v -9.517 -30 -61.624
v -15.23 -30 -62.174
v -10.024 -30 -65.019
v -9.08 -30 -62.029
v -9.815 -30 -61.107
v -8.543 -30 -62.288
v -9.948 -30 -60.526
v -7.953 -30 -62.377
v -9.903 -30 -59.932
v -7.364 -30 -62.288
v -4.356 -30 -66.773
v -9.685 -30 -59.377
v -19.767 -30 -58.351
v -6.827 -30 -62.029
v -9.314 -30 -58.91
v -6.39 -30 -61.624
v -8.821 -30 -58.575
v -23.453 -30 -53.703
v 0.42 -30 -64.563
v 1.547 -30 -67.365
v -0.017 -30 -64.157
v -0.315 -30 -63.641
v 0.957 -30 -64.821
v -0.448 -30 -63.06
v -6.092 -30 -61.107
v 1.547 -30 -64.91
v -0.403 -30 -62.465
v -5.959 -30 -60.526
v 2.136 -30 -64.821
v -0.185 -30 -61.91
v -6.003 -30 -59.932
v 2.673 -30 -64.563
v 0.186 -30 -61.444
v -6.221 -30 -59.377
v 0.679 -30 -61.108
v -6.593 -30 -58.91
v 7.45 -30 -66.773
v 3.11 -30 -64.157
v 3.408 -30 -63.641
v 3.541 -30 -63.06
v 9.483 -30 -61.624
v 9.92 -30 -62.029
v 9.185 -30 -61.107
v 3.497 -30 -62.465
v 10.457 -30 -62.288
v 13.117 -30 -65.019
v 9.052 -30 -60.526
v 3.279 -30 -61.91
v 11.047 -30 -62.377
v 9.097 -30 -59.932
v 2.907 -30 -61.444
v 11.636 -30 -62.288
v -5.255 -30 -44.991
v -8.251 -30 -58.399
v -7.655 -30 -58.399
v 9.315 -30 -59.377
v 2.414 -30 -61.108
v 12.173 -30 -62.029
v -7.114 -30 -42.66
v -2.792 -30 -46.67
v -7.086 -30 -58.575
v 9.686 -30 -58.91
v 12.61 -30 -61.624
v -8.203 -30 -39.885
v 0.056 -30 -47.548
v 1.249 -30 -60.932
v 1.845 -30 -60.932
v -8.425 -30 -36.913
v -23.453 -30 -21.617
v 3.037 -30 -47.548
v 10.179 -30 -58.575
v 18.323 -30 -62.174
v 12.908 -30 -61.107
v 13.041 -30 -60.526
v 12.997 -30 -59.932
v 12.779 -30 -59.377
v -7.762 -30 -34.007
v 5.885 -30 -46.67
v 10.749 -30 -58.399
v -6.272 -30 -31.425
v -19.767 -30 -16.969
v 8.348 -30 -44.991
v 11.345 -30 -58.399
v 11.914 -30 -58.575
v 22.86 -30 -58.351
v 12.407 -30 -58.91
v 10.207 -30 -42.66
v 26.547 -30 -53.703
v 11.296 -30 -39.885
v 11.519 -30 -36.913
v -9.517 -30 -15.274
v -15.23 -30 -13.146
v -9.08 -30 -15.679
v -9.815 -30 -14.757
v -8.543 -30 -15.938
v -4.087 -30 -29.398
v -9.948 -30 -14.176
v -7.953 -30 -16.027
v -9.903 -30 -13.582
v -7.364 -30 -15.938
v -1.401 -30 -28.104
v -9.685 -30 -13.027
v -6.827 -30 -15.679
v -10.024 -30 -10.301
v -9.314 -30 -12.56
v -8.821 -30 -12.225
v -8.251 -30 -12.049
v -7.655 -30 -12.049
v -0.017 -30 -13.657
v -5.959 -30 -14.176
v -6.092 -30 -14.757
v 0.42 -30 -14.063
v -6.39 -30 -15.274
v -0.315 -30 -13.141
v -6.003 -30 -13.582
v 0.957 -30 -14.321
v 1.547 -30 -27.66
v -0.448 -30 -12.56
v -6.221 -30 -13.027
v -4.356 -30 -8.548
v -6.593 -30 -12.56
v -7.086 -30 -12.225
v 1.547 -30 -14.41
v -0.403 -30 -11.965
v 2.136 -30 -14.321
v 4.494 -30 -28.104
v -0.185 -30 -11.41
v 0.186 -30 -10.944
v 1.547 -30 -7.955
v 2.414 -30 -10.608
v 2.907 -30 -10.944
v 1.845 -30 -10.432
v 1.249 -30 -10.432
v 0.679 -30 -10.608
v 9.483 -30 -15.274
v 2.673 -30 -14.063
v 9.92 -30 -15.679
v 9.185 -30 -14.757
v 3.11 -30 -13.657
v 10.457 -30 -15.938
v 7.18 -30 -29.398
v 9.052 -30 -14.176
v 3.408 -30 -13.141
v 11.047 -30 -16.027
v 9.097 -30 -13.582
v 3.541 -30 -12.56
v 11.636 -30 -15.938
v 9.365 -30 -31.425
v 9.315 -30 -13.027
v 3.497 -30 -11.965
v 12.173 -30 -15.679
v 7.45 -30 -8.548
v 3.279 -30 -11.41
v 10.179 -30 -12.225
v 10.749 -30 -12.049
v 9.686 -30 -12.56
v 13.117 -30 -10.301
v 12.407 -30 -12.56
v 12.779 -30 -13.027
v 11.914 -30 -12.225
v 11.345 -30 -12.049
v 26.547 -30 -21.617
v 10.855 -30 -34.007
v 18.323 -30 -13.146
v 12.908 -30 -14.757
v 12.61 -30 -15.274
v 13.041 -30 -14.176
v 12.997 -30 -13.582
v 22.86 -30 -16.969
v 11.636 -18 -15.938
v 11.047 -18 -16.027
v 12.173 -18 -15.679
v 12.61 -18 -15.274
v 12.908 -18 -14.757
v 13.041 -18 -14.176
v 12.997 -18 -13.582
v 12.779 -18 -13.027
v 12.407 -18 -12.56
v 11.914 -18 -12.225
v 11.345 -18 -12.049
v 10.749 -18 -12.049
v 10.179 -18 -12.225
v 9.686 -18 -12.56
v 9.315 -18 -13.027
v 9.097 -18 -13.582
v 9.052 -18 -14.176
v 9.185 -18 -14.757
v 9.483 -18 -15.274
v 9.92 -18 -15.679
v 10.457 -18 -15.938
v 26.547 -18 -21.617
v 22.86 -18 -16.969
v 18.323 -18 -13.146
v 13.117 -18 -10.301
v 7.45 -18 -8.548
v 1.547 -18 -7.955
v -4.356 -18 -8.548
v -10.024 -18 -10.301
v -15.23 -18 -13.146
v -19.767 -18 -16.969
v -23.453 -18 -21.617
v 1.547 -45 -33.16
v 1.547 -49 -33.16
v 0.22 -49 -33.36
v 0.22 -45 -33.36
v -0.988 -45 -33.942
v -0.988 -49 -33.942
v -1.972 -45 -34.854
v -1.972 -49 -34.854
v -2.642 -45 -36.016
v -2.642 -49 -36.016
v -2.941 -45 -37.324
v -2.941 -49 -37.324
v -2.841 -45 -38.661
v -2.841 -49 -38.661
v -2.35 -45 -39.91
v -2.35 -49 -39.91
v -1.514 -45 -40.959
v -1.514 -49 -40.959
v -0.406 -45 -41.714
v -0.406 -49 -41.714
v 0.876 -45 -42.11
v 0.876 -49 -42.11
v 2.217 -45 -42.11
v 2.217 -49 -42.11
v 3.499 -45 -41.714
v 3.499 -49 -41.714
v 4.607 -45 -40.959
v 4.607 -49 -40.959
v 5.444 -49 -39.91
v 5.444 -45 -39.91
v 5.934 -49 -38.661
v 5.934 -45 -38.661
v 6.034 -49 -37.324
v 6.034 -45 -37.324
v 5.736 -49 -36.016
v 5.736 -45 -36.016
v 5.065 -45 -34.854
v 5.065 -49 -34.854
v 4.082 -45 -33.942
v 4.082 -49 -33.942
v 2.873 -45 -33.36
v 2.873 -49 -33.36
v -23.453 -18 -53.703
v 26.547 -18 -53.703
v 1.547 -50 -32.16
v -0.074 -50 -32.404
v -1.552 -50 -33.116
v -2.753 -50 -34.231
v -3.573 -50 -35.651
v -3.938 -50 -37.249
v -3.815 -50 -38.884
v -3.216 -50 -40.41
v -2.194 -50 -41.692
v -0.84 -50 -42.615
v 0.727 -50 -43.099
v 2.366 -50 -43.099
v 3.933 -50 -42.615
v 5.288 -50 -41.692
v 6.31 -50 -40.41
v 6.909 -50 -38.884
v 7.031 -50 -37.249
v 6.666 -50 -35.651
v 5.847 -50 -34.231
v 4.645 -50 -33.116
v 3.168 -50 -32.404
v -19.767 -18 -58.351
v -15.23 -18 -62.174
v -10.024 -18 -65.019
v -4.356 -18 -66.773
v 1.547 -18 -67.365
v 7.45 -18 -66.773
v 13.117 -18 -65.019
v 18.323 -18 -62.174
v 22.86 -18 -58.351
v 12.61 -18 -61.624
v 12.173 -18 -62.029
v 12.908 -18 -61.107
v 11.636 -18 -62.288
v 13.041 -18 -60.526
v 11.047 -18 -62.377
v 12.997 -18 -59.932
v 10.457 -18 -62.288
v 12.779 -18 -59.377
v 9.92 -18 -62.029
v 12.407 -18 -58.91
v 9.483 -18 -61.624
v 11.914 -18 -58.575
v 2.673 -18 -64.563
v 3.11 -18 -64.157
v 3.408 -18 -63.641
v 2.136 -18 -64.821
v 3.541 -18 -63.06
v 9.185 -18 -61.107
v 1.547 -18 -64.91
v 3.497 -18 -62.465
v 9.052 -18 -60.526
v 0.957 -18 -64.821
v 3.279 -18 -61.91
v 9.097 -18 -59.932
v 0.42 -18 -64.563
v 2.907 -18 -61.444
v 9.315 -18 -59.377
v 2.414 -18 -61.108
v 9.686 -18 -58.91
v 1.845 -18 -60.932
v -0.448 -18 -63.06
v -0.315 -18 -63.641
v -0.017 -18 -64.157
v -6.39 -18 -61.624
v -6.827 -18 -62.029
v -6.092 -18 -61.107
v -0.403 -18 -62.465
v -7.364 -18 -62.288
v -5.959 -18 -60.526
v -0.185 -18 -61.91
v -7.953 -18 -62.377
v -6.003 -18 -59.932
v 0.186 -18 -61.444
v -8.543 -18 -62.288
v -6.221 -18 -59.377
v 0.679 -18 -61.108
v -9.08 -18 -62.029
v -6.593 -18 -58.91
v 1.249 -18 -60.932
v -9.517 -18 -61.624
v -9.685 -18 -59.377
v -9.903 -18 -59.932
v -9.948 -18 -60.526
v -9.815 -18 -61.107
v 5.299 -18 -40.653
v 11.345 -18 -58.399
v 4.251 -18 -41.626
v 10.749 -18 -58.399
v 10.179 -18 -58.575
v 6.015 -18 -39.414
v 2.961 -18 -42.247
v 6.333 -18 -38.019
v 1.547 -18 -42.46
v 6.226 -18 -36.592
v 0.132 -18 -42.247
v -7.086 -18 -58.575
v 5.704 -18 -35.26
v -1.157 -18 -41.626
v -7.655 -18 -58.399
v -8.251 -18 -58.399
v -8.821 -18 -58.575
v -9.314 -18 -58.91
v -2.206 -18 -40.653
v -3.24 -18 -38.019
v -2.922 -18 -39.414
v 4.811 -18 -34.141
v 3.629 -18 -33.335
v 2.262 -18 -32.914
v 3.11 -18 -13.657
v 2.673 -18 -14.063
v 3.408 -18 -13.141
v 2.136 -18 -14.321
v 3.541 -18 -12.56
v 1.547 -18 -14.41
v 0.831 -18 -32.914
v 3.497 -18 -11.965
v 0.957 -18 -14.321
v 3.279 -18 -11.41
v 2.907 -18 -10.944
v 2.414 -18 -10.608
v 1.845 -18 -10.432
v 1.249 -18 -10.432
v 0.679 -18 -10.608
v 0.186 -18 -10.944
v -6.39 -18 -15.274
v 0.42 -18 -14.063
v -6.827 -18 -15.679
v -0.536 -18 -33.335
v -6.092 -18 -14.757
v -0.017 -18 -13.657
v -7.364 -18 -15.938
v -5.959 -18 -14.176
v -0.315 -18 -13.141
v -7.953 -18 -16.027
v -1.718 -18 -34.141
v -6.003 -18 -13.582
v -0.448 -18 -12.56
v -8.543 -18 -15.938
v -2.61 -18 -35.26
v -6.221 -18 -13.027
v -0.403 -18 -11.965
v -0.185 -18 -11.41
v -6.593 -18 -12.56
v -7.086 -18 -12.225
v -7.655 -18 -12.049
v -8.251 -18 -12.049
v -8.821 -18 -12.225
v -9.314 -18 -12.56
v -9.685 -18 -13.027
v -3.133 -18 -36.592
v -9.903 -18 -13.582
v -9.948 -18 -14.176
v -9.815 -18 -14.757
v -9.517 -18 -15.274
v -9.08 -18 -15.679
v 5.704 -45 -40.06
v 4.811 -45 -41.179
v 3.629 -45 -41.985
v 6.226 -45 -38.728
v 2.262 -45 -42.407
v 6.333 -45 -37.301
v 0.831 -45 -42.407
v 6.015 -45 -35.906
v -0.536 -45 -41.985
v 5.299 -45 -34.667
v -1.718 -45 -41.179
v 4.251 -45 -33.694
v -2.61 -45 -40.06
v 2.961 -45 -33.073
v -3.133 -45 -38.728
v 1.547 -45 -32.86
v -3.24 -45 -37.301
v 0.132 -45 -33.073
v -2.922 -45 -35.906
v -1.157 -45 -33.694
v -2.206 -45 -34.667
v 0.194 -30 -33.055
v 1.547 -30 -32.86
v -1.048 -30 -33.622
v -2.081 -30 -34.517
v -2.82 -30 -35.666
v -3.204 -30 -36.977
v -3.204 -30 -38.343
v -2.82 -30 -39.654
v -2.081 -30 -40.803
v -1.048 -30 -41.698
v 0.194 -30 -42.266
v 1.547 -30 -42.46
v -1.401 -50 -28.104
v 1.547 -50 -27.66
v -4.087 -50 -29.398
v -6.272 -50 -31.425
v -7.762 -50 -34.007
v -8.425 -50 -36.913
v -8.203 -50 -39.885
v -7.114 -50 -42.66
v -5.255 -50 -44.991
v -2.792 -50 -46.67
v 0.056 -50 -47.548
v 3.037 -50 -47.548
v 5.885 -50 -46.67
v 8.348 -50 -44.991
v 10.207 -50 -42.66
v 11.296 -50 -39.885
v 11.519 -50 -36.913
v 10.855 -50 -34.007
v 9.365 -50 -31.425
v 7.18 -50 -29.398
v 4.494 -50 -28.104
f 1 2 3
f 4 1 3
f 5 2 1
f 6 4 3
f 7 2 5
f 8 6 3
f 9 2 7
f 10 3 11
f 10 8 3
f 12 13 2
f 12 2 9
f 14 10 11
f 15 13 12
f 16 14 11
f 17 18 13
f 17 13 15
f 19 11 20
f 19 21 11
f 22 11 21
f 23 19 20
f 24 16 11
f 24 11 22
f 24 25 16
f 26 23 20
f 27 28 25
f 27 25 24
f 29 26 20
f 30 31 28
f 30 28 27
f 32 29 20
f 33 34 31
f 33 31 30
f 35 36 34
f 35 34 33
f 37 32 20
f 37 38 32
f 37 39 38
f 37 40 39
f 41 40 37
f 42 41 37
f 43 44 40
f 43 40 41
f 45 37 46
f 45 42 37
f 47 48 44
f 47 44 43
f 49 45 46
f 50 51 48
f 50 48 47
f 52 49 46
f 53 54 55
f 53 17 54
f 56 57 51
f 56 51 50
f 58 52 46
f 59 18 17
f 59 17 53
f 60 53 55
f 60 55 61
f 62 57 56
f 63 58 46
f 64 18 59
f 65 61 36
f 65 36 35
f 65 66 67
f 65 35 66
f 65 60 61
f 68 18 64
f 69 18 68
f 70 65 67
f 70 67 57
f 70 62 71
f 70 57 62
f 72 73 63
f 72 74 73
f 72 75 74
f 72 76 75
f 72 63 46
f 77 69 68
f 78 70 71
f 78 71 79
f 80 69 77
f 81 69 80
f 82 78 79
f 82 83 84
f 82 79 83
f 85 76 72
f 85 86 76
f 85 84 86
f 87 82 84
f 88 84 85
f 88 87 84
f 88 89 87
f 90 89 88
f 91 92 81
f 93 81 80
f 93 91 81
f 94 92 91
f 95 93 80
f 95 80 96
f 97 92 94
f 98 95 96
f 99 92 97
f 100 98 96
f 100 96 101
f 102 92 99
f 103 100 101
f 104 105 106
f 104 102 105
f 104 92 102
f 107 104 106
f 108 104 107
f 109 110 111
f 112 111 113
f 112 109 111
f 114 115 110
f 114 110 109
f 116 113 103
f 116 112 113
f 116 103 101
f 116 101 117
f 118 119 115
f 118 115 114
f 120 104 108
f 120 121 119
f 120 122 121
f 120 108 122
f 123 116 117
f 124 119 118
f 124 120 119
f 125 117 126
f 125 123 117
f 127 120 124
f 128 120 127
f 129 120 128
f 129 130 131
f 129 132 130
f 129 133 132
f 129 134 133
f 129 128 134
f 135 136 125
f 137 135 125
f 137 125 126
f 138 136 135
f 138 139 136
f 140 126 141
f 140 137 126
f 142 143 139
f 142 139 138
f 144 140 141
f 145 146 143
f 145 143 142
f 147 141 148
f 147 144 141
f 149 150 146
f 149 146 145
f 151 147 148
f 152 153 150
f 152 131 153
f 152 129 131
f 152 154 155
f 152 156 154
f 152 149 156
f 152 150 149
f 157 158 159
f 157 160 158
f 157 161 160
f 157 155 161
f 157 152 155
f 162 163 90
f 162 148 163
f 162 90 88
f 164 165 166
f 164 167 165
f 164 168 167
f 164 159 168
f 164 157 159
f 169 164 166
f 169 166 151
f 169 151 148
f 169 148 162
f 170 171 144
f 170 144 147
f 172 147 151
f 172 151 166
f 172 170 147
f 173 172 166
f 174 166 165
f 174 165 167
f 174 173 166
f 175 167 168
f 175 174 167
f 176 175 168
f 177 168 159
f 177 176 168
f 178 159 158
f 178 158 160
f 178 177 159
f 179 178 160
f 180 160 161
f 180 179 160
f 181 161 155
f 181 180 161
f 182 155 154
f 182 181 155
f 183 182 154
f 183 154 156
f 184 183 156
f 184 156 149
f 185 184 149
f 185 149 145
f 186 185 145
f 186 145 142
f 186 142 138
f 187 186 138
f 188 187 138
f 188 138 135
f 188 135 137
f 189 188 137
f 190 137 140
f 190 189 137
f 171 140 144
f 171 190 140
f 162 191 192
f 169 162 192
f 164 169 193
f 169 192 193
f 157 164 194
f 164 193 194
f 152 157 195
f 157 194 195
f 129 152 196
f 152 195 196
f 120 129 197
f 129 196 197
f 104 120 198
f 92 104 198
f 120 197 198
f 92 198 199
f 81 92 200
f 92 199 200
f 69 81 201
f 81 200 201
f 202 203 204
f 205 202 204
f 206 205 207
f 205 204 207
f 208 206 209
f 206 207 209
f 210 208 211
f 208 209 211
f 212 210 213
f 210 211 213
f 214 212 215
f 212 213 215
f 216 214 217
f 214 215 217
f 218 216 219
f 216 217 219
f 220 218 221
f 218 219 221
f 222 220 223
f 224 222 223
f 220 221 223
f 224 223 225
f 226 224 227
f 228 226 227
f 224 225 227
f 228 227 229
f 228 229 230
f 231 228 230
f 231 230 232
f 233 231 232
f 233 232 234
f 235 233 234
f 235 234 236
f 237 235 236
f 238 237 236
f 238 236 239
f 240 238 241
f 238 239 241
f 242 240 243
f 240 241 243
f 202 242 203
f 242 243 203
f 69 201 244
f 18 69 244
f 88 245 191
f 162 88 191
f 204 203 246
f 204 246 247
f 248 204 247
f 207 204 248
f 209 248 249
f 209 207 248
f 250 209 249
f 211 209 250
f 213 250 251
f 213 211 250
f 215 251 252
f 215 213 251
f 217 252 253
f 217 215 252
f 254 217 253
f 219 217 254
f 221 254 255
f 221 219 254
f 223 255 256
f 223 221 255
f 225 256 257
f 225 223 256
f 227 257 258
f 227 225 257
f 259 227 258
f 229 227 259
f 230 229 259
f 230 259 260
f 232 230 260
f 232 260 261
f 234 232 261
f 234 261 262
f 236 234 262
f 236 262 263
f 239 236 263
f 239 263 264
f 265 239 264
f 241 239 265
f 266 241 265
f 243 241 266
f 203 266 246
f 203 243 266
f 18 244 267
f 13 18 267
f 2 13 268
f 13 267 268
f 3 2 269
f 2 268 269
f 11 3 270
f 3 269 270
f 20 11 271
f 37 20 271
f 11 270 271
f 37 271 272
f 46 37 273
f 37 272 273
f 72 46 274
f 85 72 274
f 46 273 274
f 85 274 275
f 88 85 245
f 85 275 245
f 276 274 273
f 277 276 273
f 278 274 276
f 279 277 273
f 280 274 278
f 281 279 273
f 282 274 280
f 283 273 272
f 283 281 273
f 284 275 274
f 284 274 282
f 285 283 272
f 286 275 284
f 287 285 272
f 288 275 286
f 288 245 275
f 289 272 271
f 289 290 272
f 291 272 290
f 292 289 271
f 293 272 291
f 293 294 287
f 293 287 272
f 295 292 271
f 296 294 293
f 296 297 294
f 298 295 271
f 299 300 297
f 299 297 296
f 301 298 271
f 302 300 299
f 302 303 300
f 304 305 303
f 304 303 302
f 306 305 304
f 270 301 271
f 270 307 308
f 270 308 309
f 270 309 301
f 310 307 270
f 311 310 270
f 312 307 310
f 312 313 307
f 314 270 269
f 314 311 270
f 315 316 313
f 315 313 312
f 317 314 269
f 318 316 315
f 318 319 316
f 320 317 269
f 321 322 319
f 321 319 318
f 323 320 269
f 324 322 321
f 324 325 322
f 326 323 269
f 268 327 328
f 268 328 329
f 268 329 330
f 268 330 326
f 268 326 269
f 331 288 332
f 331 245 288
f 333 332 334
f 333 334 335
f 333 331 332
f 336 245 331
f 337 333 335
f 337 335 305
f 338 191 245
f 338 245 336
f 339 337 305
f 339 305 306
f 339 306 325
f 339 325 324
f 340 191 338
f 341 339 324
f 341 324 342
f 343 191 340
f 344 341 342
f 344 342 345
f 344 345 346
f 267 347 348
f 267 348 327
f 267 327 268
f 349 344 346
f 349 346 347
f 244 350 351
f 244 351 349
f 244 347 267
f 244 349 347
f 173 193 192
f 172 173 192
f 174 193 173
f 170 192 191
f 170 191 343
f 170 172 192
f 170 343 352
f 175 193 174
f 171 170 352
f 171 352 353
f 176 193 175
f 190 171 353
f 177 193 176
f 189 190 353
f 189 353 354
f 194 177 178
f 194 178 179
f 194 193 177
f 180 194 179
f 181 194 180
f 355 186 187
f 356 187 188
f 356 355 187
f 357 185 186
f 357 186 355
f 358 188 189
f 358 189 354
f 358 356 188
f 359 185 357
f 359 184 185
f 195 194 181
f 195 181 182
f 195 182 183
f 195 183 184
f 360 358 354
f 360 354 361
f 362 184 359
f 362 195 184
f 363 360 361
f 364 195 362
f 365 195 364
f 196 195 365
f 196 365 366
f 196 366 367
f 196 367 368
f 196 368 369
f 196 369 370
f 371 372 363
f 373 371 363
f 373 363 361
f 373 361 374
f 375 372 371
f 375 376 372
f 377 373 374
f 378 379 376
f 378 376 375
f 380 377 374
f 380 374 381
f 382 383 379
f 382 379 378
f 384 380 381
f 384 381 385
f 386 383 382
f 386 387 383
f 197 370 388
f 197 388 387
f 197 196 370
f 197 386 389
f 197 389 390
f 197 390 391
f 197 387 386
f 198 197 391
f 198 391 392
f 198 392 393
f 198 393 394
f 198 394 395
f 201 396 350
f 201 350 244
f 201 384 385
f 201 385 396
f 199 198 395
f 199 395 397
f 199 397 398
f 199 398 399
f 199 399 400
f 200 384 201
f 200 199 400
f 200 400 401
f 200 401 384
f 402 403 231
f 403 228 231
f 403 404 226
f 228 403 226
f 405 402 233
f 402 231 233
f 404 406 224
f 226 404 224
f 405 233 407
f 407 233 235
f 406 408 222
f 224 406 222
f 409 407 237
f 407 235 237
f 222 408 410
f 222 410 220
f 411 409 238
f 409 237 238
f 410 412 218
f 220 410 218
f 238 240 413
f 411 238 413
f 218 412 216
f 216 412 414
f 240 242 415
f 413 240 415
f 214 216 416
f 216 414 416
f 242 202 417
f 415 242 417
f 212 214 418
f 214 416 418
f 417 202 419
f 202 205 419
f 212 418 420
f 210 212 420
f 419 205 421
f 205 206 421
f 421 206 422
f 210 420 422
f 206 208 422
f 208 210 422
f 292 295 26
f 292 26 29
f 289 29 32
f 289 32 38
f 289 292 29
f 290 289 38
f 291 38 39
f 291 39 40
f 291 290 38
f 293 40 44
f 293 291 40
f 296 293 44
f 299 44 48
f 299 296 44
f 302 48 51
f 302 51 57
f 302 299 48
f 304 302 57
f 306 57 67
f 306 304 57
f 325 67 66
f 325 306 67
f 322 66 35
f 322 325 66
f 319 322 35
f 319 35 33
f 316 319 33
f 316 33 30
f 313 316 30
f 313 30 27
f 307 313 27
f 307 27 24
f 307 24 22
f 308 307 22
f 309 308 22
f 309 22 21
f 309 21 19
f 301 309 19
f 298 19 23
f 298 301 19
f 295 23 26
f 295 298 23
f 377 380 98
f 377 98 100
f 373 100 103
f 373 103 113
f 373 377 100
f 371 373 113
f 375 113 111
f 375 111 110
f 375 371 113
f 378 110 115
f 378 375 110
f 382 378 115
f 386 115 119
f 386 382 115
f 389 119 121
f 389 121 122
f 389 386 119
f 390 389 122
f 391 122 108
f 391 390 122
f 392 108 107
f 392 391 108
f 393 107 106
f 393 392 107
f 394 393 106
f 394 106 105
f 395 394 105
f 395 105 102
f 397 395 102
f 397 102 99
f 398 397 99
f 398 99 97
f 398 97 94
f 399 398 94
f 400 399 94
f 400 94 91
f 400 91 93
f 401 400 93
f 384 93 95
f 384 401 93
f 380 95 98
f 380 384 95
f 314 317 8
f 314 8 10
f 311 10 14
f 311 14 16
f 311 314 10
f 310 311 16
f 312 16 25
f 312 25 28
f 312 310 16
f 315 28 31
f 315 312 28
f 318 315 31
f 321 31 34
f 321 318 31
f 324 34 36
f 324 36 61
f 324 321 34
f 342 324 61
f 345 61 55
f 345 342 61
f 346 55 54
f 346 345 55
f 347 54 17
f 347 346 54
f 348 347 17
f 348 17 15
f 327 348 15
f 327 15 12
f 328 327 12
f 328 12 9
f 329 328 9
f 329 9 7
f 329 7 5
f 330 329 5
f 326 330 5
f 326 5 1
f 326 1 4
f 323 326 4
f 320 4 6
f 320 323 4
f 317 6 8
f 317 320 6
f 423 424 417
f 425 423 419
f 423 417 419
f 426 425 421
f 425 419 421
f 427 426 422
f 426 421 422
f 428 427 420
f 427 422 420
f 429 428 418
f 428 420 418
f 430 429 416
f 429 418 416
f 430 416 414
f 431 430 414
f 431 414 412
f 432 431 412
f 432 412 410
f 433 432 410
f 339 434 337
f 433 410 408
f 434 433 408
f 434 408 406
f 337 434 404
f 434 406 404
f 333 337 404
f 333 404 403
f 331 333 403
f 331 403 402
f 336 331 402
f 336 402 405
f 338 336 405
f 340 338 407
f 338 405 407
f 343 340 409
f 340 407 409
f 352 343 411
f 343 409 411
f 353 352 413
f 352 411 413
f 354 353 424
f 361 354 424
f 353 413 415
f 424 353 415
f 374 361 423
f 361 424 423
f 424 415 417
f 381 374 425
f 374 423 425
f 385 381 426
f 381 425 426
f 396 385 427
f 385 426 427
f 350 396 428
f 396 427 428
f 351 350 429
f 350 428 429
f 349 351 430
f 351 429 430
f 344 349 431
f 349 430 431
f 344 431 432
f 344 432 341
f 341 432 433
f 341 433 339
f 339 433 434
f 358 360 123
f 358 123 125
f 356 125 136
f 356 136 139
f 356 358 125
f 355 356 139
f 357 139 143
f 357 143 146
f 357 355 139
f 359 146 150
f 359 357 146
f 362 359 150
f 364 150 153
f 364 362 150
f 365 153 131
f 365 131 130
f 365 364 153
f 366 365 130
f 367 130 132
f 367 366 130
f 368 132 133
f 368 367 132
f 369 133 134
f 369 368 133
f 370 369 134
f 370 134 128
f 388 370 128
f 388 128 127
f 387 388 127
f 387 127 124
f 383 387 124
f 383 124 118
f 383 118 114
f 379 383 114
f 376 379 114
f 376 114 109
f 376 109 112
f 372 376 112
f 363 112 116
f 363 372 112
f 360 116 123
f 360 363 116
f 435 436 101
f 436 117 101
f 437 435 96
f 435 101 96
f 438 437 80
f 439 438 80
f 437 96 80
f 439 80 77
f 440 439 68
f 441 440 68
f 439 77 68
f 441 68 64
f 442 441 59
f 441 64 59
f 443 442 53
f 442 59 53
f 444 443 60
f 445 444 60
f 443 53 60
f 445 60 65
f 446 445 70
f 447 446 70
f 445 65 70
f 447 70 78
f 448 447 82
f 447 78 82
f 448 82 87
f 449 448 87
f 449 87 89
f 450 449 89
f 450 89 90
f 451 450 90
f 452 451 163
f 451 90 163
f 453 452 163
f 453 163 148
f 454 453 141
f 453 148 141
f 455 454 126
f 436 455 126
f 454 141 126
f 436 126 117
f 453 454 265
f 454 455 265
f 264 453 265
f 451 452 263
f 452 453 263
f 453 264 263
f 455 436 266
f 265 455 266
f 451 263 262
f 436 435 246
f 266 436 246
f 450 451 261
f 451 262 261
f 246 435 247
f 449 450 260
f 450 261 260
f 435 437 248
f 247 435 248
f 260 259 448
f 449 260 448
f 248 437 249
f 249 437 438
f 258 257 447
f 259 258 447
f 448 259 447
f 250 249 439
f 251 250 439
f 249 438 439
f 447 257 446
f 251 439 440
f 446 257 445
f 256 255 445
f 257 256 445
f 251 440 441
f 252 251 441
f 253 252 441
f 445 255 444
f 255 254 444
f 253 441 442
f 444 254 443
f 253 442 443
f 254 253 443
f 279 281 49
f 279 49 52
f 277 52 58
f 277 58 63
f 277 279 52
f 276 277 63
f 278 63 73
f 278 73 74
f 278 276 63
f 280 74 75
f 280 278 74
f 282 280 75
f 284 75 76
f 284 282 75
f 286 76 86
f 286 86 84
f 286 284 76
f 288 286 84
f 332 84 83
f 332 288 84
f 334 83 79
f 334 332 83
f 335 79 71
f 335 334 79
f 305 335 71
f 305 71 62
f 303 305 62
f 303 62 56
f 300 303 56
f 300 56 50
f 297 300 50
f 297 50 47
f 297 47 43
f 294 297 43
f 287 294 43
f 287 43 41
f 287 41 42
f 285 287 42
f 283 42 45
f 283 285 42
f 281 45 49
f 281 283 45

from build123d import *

# Parameters (mm, degrees)
SKETCH1_R           = 2
BOSS_EXTRUDE1_DEPTH = 12
SKETCH2_R           = 4.8
CUT_EXTRUDE1_DEPTH  = 74.394724572
CHAMFER1_SIZE       = 1


with BuildPart() as part:
    # Sketch1 → Boss-Extrude1 (new body)
    # profile 1 of 2: a face of its own
    with BuildSketch(Plane.XZ.offset(18)):
        with BuildLine():
            Line((-23.453342414, -21.61684273), (-23.453342414, -53.703414688))
            ThreePointArc((-23.453342414, -53.703414688), (1.546657586, -67.365128709), (26.546657586, -53.703414688))
            Line((26.546657586, -53.703414688), (26.546657586, -21.61684273))
            ThreePointArc((26.546657586, -21.61684273), (1.546657586, -7.955128709), (-23.453342414, -21.61684273))
        make_face()
        with Locations(Location((-7.953342414, -60.376565813, 0), (0, 0, 270))):
            Circle(SKETCH1_R, mode=Mode.SUBTRACT)
        with BuildLine():
            ThreePointArc((16.671348492, -51.125128709), (1.546657586, -57.910128709), (-13.57803332, -51.125128709))
            Line((-13.57803332, -51.125128709), (-13.57803332, -45.660128709))
            Line((-13.57803332, -45.660128709), (-17.056097586, -45.660128709))
            ThreePointArc((-17.056097586, -45.660128709), (-18.703342414, -37.660128709), (-17.056097586, -29.660128709))
            Line((-17.056097586, -29.660128709), (-13.57803332, -29.660128709))
            Line((-13.57803332, -29.660128709), (-13.57803332, -24.195128709))
            ThreePointArc((-13.57803332, -24.195128709), (1.546657586, -17.410128709), (16.671348492, -24.195128709))
            Line((16.671348492, -24.195128709), (16.671348492, -29.660128709))
            Line((16.671348492, -29.660128709), (20.149412759, -29.660128709))
            Line((20.149412759, -29.660128709), (20.149412759, -32.660128709))
            Line((20.149412759, -32.660128709), (16.671348492, -32.660128709))
            Line((16.671348492, -32.660128709), (16.671348492, -42.660128709))
            Line((16.671348492, -42.660128709), (20.149412759, -42.660128709))
            Line((20.149412759, -42.660128709), (20.149412759, -45.660128709))
            Line((20.149412759, -45.660128709), (16.671348492, -45.660128709))
            Line((16.671348492, -45.660128709), (16.671348492, -51.125128709))
        make_face(mode=Mode.SUBTRACT)
        with Locations(Location((1.546657586, -62.910128709, 0), (0, 0, 270))):
            Circle(SKETCH1_R, mode=Mode.SUBTRACT)
        with Locations(Location((11.046657586, -60.376565813, 0), (0, 0, 270))):
            Circle(SKETCH1_R, mode=Mode.SUBTRACT)
        with Locations(Location((-7.953342414, -14.026565813, 0), (0, 0, 270))):
            Circle(SKETCH1_R, mode=Mode.SUBTRACT)
        with Locations(Location((11.046657586, -14.026565813, 0), (0, 0, 270))):
            Circle(SKETCH1_R, mode=Mode.SUBTRACT)
        with Locations(Location((1.546657586, -12.410128709, 0), (0, 0, 270))):
            Circle(SKETCH1_R, mode=Mode.SUBTRACT)
    # profile 2 of 2: a face of its own
    with BuildSketch(Plane.XZ.offset(18)):
        with BuildLine():
            Line((-13.57803332, -51.125128709), (-13.57803332, -45.660128709))
            Line((-13.57803332, -45.660128709), (-17.056097586, -45.660128709))
            ThreePointArc((-17.056097586, -45.660128709), (-18.703342414, -37.660128709), (-17.056097586, -29.660128709))
            Line((-17.056097586, -29.660128709), (-13.57803332, -29.660128709))
            Line((-13.57803332, -29.660128709), (-13.57803332, -24.195128709))
            ThreePointArc((-13.57803332, -24.195128709), (1.546657586, -17.410128709), (16.671348492, -24.195128709))
            Line((16.671348492, -24.195128709), (16.671348492, -29.660128709))
            Line((16.671348492, -29.660128709), (20.149412759, -29.660128709))
            Line((20.149412759, -29.660128709), (20.149412759, -32.660128709))
            Line((20.149412759, -32.660128709), (16.671348492, -32.660128709))
            Line((16.671348492, -32.660128709), (16.671348492, -42.660128709))
            Line((16.671348492, -42.660128709), (20.149412759, -42.660128709))
            Line((20.149412759, -42.660128709), (20.149412759, -45.660128709))
            Line((20.149412759, -45.660128709), (16.671348492, -45.660128709))
            Line((16.671348492, -45.660128709), (16.671348492, -51.125128709))
            ThreePointArc((16.671348492, -51.125128709), (1.546657586, -57.910128709), (-13.57803332, -51.125128709))
        make_face()
    extrude(amount=BOSS_EXTRUDE1_DEPTH)

    # Sketch2 → Cut-Extrude1 (cut, through all)
    with BuildSketch(Plane.XZ.offset(30)):
        with Locations(Location((1.546657586, -37.660128709, 0), (0, 0, 270))):
            Circle(SKETCH2_R)
    extrude(amount=-CUT_EXTRUDE1_DEPTH, mode=Mode.SUBTRACT)

    # Sketch3 → Revolve1 (revolve)
    with BuildSketch(Plane(origin=(1.546657586, 0, 0), x_dir=(0, 0, -1), z_dir=(1, 0, 0))):
        Polygon((27.660128709, -50), (27.660128709, -30), (32.860128709, -30), (32.860128709, -45), (33.160128709, -45), (33.160128709, -50), align=None)
    revolve(axis=Axis((1.546657586, -30, -37.660128709), (0, -1, 0)))

    # Chamfer1
    chamfer1_edges = [part.edges().sort_by_distance(p)[0] for p in [
        (1.546657586, -50, -42.160128709),
    ]]
    chamfer(chamfer1_edges, length=CHAMFER1_SIZE)


solid = part.part
